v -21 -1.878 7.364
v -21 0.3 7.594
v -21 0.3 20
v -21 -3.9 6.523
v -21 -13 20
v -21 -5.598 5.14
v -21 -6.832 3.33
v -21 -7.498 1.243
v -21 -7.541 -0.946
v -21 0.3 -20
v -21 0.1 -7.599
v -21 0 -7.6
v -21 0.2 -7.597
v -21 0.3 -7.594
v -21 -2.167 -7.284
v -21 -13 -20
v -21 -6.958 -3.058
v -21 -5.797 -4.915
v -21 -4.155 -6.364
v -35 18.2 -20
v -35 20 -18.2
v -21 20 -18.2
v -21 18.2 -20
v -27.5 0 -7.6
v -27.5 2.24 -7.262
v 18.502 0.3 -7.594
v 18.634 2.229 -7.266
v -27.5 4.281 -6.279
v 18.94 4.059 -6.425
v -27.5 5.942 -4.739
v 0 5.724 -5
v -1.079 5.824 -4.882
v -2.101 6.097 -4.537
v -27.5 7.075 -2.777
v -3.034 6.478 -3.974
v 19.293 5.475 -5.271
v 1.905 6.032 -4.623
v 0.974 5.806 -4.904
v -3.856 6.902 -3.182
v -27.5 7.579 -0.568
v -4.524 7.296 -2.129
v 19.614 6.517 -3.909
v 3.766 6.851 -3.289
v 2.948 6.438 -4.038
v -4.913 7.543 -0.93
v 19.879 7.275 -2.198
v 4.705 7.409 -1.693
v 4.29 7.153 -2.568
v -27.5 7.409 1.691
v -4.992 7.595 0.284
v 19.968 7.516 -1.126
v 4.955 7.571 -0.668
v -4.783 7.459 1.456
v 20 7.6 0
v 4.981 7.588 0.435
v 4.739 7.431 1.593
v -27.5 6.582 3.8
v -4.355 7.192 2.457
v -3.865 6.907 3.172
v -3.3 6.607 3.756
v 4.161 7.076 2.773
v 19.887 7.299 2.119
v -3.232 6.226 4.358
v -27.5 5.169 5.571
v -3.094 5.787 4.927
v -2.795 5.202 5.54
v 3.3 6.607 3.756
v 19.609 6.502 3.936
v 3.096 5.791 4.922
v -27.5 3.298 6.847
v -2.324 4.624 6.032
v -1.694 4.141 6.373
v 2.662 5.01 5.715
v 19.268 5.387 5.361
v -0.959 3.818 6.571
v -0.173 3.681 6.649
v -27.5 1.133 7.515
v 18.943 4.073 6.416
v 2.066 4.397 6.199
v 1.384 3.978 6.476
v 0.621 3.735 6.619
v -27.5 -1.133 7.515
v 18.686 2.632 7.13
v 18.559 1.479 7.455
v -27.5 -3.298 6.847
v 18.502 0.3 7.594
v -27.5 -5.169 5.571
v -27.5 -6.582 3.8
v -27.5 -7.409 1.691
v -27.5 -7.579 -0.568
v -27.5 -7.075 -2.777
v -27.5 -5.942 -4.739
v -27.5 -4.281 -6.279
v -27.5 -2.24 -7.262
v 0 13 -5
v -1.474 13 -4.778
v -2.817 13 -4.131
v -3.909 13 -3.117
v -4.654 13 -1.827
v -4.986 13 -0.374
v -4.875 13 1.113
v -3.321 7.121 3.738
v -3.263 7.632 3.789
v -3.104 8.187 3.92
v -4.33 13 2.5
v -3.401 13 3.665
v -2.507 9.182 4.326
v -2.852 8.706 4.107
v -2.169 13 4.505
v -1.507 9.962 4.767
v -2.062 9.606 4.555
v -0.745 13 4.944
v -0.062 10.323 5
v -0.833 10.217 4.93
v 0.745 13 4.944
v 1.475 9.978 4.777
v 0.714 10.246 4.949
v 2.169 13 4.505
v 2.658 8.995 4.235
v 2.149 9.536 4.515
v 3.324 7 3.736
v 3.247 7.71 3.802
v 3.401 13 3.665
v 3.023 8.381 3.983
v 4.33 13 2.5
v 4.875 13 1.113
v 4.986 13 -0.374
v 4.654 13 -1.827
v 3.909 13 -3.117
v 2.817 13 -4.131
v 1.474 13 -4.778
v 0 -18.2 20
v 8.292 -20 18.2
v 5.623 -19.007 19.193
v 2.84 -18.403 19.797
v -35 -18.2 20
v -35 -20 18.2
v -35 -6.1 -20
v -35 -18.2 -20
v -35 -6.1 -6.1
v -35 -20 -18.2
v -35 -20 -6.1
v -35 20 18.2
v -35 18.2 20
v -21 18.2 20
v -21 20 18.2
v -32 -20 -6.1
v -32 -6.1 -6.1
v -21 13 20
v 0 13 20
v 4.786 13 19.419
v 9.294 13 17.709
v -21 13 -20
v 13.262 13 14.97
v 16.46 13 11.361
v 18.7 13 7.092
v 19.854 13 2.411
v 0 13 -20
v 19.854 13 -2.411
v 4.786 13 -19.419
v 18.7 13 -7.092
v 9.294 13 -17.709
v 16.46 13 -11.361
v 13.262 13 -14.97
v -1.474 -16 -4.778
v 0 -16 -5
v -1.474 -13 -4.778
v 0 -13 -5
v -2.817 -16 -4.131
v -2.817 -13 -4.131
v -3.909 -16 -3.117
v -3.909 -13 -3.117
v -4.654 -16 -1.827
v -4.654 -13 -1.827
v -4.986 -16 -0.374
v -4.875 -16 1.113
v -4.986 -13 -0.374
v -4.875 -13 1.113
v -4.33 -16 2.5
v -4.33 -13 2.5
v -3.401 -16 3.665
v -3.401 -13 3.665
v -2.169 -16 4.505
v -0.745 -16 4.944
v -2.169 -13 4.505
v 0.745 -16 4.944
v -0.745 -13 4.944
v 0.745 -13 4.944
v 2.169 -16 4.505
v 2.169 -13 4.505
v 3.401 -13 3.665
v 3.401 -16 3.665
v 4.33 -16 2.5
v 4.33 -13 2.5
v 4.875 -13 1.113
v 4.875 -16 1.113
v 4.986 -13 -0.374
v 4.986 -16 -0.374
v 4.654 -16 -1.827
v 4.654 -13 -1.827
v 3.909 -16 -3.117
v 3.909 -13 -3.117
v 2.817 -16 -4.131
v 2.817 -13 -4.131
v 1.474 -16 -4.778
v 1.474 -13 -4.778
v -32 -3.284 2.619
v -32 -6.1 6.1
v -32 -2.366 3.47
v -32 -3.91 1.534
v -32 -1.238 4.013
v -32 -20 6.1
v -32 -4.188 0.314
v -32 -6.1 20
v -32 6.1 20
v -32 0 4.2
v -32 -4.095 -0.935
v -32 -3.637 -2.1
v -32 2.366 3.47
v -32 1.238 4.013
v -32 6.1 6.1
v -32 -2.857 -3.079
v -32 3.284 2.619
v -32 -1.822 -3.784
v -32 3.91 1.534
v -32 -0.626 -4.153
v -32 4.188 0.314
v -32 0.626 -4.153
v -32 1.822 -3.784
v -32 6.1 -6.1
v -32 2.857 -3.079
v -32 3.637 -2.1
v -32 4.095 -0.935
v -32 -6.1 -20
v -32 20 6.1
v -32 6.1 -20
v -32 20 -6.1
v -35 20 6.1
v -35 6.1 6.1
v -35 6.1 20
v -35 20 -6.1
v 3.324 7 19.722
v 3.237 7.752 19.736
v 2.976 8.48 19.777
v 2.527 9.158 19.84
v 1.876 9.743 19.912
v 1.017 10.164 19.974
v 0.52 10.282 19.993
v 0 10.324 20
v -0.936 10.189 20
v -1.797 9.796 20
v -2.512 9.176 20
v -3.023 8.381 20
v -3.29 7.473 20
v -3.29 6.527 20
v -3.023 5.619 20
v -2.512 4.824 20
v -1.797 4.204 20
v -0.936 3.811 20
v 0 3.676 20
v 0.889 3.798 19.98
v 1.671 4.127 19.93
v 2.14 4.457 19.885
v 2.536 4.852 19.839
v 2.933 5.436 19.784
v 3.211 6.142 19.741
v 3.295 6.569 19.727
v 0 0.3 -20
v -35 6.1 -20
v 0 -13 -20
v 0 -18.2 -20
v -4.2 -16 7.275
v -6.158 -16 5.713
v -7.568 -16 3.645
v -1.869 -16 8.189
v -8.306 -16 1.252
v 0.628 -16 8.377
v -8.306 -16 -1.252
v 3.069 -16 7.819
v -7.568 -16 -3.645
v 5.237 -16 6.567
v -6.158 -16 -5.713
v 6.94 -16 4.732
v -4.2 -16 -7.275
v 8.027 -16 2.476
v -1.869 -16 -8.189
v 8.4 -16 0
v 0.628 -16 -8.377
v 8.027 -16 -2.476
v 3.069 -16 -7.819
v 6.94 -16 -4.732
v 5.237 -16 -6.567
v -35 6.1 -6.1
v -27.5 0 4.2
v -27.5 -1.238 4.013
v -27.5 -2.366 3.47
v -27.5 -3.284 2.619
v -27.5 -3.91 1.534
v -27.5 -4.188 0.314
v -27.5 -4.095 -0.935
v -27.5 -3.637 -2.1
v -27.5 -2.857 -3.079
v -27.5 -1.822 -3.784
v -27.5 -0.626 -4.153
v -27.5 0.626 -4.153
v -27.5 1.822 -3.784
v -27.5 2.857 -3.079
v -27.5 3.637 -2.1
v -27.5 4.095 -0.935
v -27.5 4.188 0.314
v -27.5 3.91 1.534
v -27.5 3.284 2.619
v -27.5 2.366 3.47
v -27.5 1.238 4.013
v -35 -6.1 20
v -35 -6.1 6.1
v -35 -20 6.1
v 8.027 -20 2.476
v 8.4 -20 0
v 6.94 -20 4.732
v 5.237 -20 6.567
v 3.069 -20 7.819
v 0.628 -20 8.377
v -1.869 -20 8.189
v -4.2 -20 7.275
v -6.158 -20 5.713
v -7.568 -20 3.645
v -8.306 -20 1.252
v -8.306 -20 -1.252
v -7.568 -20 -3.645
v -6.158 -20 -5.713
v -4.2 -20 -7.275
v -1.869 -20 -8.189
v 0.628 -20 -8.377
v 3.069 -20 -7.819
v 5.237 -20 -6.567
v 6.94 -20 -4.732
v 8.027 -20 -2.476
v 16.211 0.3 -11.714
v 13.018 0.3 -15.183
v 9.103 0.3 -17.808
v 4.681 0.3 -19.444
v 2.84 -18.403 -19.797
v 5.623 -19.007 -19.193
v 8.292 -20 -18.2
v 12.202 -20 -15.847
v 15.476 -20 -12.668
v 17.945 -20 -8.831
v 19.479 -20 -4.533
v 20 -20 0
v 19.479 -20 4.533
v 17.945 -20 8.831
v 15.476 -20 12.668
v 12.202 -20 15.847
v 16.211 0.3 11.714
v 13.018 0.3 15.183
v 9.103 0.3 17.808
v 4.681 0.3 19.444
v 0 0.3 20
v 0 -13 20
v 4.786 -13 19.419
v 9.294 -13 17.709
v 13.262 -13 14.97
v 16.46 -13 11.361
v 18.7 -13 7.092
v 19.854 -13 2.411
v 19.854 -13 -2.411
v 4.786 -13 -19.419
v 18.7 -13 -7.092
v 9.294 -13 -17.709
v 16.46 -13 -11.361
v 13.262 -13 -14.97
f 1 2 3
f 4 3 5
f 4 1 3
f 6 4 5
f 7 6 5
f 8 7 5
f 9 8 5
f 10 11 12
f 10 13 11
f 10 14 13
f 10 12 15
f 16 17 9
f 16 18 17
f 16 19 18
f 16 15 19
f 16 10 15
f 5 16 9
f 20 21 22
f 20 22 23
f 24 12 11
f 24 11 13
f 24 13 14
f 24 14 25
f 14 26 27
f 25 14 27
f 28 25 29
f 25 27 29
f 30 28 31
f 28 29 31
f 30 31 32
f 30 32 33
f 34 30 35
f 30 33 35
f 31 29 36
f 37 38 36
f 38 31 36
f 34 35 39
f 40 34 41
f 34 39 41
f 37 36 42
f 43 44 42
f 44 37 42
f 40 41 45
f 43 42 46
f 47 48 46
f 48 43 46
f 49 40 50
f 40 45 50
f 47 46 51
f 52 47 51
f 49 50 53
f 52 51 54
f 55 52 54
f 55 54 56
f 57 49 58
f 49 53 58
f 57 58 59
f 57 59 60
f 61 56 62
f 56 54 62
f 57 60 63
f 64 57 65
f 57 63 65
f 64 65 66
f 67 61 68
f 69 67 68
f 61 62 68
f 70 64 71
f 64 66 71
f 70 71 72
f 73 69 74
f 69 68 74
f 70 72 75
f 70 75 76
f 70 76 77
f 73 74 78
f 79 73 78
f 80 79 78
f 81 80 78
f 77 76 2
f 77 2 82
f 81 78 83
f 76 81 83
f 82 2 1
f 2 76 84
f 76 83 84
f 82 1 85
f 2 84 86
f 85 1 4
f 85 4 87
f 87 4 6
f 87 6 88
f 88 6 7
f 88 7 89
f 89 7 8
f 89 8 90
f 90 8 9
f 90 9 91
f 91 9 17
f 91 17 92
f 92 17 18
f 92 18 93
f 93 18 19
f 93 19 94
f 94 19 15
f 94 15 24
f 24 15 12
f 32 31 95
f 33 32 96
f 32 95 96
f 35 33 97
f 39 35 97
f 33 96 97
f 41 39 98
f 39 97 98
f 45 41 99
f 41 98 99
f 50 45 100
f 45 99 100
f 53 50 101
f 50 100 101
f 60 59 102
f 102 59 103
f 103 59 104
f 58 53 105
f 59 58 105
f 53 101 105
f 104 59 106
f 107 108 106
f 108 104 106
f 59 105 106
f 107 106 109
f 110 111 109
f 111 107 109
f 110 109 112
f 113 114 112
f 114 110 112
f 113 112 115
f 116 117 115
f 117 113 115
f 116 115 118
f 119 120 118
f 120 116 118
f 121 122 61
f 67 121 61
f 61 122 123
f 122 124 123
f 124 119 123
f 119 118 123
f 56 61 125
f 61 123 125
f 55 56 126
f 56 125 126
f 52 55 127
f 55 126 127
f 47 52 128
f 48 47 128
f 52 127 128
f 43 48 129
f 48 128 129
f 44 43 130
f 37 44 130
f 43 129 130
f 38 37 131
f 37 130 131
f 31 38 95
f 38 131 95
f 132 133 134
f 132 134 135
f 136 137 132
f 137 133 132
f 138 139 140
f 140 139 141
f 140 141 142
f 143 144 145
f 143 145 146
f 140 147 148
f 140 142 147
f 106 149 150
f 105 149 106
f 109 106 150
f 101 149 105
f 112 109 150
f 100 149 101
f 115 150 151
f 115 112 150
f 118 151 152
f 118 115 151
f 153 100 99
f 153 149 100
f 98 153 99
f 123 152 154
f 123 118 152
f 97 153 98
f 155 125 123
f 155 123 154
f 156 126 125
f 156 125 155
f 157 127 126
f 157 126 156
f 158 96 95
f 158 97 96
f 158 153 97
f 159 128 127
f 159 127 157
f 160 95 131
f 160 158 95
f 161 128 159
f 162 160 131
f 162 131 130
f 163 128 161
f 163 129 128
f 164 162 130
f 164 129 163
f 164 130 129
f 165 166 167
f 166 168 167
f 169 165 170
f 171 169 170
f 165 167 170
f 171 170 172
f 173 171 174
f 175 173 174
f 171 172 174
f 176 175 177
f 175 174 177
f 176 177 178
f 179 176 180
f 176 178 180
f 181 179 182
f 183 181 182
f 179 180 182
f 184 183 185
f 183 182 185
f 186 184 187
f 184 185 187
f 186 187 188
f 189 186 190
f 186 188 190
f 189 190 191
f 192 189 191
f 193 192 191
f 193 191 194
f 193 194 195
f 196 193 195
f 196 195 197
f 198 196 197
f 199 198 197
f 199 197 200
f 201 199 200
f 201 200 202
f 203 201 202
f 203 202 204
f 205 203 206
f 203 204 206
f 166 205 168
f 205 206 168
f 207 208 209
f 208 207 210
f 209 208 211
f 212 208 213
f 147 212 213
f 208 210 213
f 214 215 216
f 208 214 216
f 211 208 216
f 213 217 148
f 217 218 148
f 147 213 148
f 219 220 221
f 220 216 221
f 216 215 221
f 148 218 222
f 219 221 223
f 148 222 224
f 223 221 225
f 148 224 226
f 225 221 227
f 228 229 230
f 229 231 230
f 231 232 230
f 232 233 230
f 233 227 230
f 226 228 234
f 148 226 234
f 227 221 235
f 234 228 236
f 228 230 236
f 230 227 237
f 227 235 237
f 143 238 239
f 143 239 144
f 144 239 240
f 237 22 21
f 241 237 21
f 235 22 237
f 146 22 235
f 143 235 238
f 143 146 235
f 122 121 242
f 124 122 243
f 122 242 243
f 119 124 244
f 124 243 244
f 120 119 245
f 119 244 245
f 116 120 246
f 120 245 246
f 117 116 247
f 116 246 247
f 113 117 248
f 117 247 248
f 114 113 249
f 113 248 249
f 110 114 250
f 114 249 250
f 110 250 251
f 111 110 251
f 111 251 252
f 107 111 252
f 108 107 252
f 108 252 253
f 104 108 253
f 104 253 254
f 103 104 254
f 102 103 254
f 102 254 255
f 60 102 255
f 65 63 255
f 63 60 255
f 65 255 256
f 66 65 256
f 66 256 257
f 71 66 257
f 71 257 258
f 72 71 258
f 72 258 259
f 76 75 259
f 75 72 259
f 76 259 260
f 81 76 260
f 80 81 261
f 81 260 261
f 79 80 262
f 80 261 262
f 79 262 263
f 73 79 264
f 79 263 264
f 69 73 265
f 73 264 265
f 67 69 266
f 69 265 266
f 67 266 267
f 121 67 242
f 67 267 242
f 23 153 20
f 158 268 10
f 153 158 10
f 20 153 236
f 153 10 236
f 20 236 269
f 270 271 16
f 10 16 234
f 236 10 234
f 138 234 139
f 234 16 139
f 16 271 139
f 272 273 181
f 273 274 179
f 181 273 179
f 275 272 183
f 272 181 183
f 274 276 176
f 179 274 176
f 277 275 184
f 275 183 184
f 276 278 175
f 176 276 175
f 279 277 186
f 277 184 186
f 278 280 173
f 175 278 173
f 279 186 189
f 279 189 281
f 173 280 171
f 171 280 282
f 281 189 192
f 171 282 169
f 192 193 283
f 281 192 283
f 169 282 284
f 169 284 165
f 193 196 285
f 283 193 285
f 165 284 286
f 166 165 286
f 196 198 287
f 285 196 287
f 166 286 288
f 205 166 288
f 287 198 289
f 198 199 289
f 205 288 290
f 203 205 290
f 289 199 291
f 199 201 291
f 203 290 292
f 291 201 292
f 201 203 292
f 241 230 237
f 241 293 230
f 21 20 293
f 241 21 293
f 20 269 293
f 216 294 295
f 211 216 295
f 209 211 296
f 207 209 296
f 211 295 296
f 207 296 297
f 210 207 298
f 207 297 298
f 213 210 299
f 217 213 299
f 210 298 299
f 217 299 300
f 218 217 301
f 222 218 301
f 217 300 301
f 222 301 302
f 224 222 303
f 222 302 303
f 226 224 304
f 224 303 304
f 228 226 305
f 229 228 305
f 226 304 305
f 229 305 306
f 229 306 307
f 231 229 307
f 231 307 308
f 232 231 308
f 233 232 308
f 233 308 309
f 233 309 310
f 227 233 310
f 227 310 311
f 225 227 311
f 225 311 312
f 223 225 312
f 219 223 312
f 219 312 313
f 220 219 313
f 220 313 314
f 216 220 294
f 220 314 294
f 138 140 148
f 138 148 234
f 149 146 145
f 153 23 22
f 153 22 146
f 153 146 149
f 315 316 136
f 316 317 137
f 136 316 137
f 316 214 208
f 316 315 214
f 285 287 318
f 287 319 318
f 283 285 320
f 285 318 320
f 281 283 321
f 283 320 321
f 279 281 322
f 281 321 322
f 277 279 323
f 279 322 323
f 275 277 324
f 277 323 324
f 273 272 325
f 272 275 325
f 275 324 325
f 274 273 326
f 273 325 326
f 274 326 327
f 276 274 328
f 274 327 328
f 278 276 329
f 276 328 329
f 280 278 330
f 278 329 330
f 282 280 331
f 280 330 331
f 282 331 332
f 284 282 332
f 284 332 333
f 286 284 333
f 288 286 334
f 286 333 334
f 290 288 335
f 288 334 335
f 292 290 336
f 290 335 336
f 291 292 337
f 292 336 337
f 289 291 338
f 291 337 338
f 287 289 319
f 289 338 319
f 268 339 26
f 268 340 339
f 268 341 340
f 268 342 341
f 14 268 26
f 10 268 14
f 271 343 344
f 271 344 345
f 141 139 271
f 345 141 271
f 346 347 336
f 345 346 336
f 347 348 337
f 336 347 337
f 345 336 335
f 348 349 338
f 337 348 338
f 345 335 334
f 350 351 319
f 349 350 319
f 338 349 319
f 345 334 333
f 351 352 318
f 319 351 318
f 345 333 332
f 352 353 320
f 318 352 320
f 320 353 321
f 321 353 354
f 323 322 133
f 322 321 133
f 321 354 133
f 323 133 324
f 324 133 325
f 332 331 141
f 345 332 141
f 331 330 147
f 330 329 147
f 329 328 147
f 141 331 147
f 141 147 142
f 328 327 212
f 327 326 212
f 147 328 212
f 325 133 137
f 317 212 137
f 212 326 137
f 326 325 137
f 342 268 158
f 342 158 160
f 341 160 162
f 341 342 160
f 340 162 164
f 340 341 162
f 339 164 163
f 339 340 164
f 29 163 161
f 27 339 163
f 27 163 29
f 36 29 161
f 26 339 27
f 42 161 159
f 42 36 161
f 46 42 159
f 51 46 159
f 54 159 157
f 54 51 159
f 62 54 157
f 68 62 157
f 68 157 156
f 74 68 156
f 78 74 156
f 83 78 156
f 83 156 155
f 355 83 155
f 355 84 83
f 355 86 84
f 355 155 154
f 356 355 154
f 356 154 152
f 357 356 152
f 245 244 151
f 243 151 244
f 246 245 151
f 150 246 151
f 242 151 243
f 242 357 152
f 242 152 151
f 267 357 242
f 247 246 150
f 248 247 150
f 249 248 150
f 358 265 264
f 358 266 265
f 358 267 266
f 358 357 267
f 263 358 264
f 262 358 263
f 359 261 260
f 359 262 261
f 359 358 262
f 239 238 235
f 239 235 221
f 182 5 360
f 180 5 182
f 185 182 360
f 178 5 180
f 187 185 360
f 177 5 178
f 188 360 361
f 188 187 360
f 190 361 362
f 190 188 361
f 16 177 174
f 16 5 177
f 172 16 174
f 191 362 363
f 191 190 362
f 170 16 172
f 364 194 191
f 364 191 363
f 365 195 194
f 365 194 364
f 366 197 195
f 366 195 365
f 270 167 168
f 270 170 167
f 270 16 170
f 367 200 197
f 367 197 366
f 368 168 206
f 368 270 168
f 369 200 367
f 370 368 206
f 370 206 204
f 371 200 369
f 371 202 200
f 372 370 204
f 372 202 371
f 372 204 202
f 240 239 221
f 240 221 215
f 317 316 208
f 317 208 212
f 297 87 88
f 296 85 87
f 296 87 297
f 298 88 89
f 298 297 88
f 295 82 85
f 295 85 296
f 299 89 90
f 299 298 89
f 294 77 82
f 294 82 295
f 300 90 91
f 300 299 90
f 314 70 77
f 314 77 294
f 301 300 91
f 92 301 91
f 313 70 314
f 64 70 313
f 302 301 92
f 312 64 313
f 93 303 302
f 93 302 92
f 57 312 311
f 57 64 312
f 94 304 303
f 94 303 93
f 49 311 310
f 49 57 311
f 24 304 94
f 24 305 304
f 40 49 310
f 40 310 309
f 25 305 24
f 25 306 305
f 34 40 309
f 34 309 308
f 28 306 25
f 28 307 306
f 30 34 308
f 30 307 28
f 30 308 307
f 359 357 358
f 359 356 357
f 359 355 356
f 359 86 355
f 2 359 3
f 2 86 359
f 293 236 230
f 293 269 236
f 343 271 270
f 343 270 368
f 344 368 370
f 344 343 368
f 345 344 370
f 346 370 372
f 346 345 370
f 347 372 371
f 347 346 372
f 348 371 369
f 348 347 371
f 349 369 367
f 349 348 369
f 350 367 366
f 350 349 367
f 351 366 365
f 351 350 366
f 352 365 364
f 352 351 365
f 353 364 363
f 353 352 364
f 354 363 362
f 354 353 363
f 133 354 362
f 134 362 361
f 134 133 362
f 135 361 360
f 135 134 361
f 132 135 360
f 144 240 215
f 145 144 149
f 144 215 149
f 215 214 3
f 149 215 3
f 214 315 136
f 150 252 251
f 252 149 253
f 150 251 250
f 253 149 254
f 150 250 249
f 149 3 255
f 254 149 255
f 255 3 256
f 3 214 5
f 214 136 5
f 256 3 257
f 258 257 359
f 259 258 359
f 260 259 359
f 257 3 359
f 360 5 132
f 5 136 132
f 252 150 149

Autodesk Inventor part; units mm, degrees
sketch "Skizze_1" plane through (0, 0, 0) normal (0, 1, 0) x (-1, 0, 0)
  line L0 (35, -20) -> (35, 20)
  line L1 (35, 20) -> (0, 20)
  arc A0 (0, 20) -> (0, -20) centre (0, 0) ccw
  line L2 (0, -20) -> (35, -20)
extrude "Extrusion1" add sketch "Skizze_1" along normal mid plane 40
sketch "Skizze_2" plane through (0, 0, 0) normal (0, 0, 1) x (1, 0, 0)
  line L0 (-21, 20) -> (-21, 13)
  line L1 (-21, 13) -> (20, 13)
  line L2 (20, 13) -> (20, 20)
  line L3 (20, 20) -> (-21, 20)
extrude "Extrusion2" cut sketch "Skizze_2" along normal mid plane 40
sketch "Skizze_3" plane through (0, 0, 0) normal (0, 0, 1) x (1, 0, 0)
  line L0 (-21, -13) -> (20, -13)
  line L1 (20, -13) -> (20, 0.3)
  line L2 (20, 0.3) -> (-21, 0.3)
  line L3 (-21, 0.3) -> (-21, -13)
extrude "Extrusion3" cut sketch "Skizze_3" along normal mid plane 40
sketch "Skizze_4" plane through (20, 0, 0) normal (1, 0, 0) x (0, 0, -1)
  circle A0 centre (0, 0) radius 7.6
extrude "Extrusion4" cut sketch "Skizze_4" against normal blind 47.5
sketch "Sketch5" plane through (-35, -20, -20) normal (-1, 0, 0) x (0, 0, 1)
  point P0 (20, 20)
hole "Drilling 2" at (-35, 0, 0) direction (1, 0, 0) diameter 8.4 depth 11
sketch "Skizze_6" plane through (-35, 0, 0) normal (1, 0, 0) x (0, 0, -1)
  line L0 (-20, -6.1) -> (-6.1, -6.1)
  line L1 (-6.1, -6.1) -> (-6.1, -20)
  line L2 (-6.1, -20) -> (6.1, -20)
  line L3 (6.1, -20) -> (6.1, -6.1)
  line L4 (6.1, -6.1) -> (20, -6.1)
  line L5 (20, -6.1) -> (20, 6.1)
  line L6 (20, 6.1) -> (6.1, 6.1)
  line L7 (6.1, 6.1) -> (6.1, 20)
  line L8 (6.1, 20) -> (-6.1, 20)
  line L9 (-6.1, 20) -> (-6.1, 6.1)
  line L10 (-6.1, 6.1) -> (-20, 6.1)
  line L11 (-20, 6.1) -> (-20, -6.1)
extrude "Extrusion5" cut sketch "Skizze_6" along normal blind 3
sketch "Skizze_7" plane through (-35, 0, 0) normal (1, 0, 0) x (0, 0, -1)
  line L0 (18.2, 20) -> (20, 18.2)
  line L1 (20, 18.2) -> (20, 20)
  line L2 (20, 20) -> (18.2, 20)
extrude "Extrusion6" cut sketch "Skizze_7" along normal blind 55
sketch "Skizze_8" plane through (-35, 0, 0) normal (1, 0, 0) x (0, 0, -1)
  line L0 (-20, 20) -> (-20, 18.2)
  line L1 (-20, 18.2) -> (-18.2, 20)
  line L2 (-18.2, 20) -> (-20, 20)
extrude "Extrusion7" cut sketch "Skizze_8" along normal blind 55
sketch "Skizze_9" plane through (-35, 0, 0) normal (1, 0, 0) x (0, 0, -1)
  line L0 (-20, -20) -> (-18.2, -20)
  line L1 (-18.2, -20) -> (-20, -18.2)
  line L2 (-20, -18.2) -> (-20, -20)
extrude "Extrusion8" cut sketch "Skizze_9" along normal blind 55
sketch "Skizze_10" plane through (-35, 0, 0) normal (1, 0, 0) x (0, 0, -1)
  line L0 (18.2, -20) -> (20, -20)
  line L1 (20, -20) -> (20, -18.2)
  line L2 (20, -18.2) -> (18.2, -20)
extrude "Extrusion9" cut sketch "Skizze_10" along normal blind 55
sketch "Sketch11" plane through (0, -20, 0) normal (0, -1, 0) x (1, 0, 0)
  point P0 (0, 0)
hole "Drilling 3" at (0, -20, 0) direction (0, 1, 0) diameter 10 depth 40
sketch "Skizze_12" plane through (0, -20, 0) normal (0, 1, 0) x (1, 0, 0)
  circle A0 centre (0, 0) radius 8.4
extrude "Extrusion10" cut sketch "Skizze_12" along normal blind 4
sketch "Skizze_13" plane through (0, 0, 20) normal (0, 0, 1) x (1, 0, 0)
  circle A0 centre (0, 7) radius 3.3235
extrude "Extrusion11" cut sketch "Skizze_13" against normal blind 20
ref_plane "re_XY" through (0, 0, 0) normal (0, 1, 0) x (1, 0, 0)
ref_plane "re_YZ" through (0, 0, 0) normal (1, 0, 0) x (0, 0, -1)
ref_plane "re_ZX" through (0, 0, 0) normal (0, 0, -1) x (0, 1, 0)
ref_plane "bo1_XY" through (0, -20, 0) normal (0, 1, 0) x (1, 0, 0)
ref_plane "bo1_YZ" through (0, -20, 0) normal (1, 0, 0) x (0, 0, -1)
ref_plane "bo1_ZX" through (0, -20, 0) normal (0, 0, -1) x (0, 1, 0)
ref_plane "hebel_XY" through (0, 16, 0) normal (0, 1, 0) x (1, 0, 0)
ref_plane "hebel_YZ" through (0, 16, 0) normal (1, 0, 0) x (0, 0, -1)
ref_plane "hebel_ZX" through (0, 16, 0) normal (0, 0, -1) x (0, 1, 0)
properties part number "May Tec 1.63.14041_Base plates"
